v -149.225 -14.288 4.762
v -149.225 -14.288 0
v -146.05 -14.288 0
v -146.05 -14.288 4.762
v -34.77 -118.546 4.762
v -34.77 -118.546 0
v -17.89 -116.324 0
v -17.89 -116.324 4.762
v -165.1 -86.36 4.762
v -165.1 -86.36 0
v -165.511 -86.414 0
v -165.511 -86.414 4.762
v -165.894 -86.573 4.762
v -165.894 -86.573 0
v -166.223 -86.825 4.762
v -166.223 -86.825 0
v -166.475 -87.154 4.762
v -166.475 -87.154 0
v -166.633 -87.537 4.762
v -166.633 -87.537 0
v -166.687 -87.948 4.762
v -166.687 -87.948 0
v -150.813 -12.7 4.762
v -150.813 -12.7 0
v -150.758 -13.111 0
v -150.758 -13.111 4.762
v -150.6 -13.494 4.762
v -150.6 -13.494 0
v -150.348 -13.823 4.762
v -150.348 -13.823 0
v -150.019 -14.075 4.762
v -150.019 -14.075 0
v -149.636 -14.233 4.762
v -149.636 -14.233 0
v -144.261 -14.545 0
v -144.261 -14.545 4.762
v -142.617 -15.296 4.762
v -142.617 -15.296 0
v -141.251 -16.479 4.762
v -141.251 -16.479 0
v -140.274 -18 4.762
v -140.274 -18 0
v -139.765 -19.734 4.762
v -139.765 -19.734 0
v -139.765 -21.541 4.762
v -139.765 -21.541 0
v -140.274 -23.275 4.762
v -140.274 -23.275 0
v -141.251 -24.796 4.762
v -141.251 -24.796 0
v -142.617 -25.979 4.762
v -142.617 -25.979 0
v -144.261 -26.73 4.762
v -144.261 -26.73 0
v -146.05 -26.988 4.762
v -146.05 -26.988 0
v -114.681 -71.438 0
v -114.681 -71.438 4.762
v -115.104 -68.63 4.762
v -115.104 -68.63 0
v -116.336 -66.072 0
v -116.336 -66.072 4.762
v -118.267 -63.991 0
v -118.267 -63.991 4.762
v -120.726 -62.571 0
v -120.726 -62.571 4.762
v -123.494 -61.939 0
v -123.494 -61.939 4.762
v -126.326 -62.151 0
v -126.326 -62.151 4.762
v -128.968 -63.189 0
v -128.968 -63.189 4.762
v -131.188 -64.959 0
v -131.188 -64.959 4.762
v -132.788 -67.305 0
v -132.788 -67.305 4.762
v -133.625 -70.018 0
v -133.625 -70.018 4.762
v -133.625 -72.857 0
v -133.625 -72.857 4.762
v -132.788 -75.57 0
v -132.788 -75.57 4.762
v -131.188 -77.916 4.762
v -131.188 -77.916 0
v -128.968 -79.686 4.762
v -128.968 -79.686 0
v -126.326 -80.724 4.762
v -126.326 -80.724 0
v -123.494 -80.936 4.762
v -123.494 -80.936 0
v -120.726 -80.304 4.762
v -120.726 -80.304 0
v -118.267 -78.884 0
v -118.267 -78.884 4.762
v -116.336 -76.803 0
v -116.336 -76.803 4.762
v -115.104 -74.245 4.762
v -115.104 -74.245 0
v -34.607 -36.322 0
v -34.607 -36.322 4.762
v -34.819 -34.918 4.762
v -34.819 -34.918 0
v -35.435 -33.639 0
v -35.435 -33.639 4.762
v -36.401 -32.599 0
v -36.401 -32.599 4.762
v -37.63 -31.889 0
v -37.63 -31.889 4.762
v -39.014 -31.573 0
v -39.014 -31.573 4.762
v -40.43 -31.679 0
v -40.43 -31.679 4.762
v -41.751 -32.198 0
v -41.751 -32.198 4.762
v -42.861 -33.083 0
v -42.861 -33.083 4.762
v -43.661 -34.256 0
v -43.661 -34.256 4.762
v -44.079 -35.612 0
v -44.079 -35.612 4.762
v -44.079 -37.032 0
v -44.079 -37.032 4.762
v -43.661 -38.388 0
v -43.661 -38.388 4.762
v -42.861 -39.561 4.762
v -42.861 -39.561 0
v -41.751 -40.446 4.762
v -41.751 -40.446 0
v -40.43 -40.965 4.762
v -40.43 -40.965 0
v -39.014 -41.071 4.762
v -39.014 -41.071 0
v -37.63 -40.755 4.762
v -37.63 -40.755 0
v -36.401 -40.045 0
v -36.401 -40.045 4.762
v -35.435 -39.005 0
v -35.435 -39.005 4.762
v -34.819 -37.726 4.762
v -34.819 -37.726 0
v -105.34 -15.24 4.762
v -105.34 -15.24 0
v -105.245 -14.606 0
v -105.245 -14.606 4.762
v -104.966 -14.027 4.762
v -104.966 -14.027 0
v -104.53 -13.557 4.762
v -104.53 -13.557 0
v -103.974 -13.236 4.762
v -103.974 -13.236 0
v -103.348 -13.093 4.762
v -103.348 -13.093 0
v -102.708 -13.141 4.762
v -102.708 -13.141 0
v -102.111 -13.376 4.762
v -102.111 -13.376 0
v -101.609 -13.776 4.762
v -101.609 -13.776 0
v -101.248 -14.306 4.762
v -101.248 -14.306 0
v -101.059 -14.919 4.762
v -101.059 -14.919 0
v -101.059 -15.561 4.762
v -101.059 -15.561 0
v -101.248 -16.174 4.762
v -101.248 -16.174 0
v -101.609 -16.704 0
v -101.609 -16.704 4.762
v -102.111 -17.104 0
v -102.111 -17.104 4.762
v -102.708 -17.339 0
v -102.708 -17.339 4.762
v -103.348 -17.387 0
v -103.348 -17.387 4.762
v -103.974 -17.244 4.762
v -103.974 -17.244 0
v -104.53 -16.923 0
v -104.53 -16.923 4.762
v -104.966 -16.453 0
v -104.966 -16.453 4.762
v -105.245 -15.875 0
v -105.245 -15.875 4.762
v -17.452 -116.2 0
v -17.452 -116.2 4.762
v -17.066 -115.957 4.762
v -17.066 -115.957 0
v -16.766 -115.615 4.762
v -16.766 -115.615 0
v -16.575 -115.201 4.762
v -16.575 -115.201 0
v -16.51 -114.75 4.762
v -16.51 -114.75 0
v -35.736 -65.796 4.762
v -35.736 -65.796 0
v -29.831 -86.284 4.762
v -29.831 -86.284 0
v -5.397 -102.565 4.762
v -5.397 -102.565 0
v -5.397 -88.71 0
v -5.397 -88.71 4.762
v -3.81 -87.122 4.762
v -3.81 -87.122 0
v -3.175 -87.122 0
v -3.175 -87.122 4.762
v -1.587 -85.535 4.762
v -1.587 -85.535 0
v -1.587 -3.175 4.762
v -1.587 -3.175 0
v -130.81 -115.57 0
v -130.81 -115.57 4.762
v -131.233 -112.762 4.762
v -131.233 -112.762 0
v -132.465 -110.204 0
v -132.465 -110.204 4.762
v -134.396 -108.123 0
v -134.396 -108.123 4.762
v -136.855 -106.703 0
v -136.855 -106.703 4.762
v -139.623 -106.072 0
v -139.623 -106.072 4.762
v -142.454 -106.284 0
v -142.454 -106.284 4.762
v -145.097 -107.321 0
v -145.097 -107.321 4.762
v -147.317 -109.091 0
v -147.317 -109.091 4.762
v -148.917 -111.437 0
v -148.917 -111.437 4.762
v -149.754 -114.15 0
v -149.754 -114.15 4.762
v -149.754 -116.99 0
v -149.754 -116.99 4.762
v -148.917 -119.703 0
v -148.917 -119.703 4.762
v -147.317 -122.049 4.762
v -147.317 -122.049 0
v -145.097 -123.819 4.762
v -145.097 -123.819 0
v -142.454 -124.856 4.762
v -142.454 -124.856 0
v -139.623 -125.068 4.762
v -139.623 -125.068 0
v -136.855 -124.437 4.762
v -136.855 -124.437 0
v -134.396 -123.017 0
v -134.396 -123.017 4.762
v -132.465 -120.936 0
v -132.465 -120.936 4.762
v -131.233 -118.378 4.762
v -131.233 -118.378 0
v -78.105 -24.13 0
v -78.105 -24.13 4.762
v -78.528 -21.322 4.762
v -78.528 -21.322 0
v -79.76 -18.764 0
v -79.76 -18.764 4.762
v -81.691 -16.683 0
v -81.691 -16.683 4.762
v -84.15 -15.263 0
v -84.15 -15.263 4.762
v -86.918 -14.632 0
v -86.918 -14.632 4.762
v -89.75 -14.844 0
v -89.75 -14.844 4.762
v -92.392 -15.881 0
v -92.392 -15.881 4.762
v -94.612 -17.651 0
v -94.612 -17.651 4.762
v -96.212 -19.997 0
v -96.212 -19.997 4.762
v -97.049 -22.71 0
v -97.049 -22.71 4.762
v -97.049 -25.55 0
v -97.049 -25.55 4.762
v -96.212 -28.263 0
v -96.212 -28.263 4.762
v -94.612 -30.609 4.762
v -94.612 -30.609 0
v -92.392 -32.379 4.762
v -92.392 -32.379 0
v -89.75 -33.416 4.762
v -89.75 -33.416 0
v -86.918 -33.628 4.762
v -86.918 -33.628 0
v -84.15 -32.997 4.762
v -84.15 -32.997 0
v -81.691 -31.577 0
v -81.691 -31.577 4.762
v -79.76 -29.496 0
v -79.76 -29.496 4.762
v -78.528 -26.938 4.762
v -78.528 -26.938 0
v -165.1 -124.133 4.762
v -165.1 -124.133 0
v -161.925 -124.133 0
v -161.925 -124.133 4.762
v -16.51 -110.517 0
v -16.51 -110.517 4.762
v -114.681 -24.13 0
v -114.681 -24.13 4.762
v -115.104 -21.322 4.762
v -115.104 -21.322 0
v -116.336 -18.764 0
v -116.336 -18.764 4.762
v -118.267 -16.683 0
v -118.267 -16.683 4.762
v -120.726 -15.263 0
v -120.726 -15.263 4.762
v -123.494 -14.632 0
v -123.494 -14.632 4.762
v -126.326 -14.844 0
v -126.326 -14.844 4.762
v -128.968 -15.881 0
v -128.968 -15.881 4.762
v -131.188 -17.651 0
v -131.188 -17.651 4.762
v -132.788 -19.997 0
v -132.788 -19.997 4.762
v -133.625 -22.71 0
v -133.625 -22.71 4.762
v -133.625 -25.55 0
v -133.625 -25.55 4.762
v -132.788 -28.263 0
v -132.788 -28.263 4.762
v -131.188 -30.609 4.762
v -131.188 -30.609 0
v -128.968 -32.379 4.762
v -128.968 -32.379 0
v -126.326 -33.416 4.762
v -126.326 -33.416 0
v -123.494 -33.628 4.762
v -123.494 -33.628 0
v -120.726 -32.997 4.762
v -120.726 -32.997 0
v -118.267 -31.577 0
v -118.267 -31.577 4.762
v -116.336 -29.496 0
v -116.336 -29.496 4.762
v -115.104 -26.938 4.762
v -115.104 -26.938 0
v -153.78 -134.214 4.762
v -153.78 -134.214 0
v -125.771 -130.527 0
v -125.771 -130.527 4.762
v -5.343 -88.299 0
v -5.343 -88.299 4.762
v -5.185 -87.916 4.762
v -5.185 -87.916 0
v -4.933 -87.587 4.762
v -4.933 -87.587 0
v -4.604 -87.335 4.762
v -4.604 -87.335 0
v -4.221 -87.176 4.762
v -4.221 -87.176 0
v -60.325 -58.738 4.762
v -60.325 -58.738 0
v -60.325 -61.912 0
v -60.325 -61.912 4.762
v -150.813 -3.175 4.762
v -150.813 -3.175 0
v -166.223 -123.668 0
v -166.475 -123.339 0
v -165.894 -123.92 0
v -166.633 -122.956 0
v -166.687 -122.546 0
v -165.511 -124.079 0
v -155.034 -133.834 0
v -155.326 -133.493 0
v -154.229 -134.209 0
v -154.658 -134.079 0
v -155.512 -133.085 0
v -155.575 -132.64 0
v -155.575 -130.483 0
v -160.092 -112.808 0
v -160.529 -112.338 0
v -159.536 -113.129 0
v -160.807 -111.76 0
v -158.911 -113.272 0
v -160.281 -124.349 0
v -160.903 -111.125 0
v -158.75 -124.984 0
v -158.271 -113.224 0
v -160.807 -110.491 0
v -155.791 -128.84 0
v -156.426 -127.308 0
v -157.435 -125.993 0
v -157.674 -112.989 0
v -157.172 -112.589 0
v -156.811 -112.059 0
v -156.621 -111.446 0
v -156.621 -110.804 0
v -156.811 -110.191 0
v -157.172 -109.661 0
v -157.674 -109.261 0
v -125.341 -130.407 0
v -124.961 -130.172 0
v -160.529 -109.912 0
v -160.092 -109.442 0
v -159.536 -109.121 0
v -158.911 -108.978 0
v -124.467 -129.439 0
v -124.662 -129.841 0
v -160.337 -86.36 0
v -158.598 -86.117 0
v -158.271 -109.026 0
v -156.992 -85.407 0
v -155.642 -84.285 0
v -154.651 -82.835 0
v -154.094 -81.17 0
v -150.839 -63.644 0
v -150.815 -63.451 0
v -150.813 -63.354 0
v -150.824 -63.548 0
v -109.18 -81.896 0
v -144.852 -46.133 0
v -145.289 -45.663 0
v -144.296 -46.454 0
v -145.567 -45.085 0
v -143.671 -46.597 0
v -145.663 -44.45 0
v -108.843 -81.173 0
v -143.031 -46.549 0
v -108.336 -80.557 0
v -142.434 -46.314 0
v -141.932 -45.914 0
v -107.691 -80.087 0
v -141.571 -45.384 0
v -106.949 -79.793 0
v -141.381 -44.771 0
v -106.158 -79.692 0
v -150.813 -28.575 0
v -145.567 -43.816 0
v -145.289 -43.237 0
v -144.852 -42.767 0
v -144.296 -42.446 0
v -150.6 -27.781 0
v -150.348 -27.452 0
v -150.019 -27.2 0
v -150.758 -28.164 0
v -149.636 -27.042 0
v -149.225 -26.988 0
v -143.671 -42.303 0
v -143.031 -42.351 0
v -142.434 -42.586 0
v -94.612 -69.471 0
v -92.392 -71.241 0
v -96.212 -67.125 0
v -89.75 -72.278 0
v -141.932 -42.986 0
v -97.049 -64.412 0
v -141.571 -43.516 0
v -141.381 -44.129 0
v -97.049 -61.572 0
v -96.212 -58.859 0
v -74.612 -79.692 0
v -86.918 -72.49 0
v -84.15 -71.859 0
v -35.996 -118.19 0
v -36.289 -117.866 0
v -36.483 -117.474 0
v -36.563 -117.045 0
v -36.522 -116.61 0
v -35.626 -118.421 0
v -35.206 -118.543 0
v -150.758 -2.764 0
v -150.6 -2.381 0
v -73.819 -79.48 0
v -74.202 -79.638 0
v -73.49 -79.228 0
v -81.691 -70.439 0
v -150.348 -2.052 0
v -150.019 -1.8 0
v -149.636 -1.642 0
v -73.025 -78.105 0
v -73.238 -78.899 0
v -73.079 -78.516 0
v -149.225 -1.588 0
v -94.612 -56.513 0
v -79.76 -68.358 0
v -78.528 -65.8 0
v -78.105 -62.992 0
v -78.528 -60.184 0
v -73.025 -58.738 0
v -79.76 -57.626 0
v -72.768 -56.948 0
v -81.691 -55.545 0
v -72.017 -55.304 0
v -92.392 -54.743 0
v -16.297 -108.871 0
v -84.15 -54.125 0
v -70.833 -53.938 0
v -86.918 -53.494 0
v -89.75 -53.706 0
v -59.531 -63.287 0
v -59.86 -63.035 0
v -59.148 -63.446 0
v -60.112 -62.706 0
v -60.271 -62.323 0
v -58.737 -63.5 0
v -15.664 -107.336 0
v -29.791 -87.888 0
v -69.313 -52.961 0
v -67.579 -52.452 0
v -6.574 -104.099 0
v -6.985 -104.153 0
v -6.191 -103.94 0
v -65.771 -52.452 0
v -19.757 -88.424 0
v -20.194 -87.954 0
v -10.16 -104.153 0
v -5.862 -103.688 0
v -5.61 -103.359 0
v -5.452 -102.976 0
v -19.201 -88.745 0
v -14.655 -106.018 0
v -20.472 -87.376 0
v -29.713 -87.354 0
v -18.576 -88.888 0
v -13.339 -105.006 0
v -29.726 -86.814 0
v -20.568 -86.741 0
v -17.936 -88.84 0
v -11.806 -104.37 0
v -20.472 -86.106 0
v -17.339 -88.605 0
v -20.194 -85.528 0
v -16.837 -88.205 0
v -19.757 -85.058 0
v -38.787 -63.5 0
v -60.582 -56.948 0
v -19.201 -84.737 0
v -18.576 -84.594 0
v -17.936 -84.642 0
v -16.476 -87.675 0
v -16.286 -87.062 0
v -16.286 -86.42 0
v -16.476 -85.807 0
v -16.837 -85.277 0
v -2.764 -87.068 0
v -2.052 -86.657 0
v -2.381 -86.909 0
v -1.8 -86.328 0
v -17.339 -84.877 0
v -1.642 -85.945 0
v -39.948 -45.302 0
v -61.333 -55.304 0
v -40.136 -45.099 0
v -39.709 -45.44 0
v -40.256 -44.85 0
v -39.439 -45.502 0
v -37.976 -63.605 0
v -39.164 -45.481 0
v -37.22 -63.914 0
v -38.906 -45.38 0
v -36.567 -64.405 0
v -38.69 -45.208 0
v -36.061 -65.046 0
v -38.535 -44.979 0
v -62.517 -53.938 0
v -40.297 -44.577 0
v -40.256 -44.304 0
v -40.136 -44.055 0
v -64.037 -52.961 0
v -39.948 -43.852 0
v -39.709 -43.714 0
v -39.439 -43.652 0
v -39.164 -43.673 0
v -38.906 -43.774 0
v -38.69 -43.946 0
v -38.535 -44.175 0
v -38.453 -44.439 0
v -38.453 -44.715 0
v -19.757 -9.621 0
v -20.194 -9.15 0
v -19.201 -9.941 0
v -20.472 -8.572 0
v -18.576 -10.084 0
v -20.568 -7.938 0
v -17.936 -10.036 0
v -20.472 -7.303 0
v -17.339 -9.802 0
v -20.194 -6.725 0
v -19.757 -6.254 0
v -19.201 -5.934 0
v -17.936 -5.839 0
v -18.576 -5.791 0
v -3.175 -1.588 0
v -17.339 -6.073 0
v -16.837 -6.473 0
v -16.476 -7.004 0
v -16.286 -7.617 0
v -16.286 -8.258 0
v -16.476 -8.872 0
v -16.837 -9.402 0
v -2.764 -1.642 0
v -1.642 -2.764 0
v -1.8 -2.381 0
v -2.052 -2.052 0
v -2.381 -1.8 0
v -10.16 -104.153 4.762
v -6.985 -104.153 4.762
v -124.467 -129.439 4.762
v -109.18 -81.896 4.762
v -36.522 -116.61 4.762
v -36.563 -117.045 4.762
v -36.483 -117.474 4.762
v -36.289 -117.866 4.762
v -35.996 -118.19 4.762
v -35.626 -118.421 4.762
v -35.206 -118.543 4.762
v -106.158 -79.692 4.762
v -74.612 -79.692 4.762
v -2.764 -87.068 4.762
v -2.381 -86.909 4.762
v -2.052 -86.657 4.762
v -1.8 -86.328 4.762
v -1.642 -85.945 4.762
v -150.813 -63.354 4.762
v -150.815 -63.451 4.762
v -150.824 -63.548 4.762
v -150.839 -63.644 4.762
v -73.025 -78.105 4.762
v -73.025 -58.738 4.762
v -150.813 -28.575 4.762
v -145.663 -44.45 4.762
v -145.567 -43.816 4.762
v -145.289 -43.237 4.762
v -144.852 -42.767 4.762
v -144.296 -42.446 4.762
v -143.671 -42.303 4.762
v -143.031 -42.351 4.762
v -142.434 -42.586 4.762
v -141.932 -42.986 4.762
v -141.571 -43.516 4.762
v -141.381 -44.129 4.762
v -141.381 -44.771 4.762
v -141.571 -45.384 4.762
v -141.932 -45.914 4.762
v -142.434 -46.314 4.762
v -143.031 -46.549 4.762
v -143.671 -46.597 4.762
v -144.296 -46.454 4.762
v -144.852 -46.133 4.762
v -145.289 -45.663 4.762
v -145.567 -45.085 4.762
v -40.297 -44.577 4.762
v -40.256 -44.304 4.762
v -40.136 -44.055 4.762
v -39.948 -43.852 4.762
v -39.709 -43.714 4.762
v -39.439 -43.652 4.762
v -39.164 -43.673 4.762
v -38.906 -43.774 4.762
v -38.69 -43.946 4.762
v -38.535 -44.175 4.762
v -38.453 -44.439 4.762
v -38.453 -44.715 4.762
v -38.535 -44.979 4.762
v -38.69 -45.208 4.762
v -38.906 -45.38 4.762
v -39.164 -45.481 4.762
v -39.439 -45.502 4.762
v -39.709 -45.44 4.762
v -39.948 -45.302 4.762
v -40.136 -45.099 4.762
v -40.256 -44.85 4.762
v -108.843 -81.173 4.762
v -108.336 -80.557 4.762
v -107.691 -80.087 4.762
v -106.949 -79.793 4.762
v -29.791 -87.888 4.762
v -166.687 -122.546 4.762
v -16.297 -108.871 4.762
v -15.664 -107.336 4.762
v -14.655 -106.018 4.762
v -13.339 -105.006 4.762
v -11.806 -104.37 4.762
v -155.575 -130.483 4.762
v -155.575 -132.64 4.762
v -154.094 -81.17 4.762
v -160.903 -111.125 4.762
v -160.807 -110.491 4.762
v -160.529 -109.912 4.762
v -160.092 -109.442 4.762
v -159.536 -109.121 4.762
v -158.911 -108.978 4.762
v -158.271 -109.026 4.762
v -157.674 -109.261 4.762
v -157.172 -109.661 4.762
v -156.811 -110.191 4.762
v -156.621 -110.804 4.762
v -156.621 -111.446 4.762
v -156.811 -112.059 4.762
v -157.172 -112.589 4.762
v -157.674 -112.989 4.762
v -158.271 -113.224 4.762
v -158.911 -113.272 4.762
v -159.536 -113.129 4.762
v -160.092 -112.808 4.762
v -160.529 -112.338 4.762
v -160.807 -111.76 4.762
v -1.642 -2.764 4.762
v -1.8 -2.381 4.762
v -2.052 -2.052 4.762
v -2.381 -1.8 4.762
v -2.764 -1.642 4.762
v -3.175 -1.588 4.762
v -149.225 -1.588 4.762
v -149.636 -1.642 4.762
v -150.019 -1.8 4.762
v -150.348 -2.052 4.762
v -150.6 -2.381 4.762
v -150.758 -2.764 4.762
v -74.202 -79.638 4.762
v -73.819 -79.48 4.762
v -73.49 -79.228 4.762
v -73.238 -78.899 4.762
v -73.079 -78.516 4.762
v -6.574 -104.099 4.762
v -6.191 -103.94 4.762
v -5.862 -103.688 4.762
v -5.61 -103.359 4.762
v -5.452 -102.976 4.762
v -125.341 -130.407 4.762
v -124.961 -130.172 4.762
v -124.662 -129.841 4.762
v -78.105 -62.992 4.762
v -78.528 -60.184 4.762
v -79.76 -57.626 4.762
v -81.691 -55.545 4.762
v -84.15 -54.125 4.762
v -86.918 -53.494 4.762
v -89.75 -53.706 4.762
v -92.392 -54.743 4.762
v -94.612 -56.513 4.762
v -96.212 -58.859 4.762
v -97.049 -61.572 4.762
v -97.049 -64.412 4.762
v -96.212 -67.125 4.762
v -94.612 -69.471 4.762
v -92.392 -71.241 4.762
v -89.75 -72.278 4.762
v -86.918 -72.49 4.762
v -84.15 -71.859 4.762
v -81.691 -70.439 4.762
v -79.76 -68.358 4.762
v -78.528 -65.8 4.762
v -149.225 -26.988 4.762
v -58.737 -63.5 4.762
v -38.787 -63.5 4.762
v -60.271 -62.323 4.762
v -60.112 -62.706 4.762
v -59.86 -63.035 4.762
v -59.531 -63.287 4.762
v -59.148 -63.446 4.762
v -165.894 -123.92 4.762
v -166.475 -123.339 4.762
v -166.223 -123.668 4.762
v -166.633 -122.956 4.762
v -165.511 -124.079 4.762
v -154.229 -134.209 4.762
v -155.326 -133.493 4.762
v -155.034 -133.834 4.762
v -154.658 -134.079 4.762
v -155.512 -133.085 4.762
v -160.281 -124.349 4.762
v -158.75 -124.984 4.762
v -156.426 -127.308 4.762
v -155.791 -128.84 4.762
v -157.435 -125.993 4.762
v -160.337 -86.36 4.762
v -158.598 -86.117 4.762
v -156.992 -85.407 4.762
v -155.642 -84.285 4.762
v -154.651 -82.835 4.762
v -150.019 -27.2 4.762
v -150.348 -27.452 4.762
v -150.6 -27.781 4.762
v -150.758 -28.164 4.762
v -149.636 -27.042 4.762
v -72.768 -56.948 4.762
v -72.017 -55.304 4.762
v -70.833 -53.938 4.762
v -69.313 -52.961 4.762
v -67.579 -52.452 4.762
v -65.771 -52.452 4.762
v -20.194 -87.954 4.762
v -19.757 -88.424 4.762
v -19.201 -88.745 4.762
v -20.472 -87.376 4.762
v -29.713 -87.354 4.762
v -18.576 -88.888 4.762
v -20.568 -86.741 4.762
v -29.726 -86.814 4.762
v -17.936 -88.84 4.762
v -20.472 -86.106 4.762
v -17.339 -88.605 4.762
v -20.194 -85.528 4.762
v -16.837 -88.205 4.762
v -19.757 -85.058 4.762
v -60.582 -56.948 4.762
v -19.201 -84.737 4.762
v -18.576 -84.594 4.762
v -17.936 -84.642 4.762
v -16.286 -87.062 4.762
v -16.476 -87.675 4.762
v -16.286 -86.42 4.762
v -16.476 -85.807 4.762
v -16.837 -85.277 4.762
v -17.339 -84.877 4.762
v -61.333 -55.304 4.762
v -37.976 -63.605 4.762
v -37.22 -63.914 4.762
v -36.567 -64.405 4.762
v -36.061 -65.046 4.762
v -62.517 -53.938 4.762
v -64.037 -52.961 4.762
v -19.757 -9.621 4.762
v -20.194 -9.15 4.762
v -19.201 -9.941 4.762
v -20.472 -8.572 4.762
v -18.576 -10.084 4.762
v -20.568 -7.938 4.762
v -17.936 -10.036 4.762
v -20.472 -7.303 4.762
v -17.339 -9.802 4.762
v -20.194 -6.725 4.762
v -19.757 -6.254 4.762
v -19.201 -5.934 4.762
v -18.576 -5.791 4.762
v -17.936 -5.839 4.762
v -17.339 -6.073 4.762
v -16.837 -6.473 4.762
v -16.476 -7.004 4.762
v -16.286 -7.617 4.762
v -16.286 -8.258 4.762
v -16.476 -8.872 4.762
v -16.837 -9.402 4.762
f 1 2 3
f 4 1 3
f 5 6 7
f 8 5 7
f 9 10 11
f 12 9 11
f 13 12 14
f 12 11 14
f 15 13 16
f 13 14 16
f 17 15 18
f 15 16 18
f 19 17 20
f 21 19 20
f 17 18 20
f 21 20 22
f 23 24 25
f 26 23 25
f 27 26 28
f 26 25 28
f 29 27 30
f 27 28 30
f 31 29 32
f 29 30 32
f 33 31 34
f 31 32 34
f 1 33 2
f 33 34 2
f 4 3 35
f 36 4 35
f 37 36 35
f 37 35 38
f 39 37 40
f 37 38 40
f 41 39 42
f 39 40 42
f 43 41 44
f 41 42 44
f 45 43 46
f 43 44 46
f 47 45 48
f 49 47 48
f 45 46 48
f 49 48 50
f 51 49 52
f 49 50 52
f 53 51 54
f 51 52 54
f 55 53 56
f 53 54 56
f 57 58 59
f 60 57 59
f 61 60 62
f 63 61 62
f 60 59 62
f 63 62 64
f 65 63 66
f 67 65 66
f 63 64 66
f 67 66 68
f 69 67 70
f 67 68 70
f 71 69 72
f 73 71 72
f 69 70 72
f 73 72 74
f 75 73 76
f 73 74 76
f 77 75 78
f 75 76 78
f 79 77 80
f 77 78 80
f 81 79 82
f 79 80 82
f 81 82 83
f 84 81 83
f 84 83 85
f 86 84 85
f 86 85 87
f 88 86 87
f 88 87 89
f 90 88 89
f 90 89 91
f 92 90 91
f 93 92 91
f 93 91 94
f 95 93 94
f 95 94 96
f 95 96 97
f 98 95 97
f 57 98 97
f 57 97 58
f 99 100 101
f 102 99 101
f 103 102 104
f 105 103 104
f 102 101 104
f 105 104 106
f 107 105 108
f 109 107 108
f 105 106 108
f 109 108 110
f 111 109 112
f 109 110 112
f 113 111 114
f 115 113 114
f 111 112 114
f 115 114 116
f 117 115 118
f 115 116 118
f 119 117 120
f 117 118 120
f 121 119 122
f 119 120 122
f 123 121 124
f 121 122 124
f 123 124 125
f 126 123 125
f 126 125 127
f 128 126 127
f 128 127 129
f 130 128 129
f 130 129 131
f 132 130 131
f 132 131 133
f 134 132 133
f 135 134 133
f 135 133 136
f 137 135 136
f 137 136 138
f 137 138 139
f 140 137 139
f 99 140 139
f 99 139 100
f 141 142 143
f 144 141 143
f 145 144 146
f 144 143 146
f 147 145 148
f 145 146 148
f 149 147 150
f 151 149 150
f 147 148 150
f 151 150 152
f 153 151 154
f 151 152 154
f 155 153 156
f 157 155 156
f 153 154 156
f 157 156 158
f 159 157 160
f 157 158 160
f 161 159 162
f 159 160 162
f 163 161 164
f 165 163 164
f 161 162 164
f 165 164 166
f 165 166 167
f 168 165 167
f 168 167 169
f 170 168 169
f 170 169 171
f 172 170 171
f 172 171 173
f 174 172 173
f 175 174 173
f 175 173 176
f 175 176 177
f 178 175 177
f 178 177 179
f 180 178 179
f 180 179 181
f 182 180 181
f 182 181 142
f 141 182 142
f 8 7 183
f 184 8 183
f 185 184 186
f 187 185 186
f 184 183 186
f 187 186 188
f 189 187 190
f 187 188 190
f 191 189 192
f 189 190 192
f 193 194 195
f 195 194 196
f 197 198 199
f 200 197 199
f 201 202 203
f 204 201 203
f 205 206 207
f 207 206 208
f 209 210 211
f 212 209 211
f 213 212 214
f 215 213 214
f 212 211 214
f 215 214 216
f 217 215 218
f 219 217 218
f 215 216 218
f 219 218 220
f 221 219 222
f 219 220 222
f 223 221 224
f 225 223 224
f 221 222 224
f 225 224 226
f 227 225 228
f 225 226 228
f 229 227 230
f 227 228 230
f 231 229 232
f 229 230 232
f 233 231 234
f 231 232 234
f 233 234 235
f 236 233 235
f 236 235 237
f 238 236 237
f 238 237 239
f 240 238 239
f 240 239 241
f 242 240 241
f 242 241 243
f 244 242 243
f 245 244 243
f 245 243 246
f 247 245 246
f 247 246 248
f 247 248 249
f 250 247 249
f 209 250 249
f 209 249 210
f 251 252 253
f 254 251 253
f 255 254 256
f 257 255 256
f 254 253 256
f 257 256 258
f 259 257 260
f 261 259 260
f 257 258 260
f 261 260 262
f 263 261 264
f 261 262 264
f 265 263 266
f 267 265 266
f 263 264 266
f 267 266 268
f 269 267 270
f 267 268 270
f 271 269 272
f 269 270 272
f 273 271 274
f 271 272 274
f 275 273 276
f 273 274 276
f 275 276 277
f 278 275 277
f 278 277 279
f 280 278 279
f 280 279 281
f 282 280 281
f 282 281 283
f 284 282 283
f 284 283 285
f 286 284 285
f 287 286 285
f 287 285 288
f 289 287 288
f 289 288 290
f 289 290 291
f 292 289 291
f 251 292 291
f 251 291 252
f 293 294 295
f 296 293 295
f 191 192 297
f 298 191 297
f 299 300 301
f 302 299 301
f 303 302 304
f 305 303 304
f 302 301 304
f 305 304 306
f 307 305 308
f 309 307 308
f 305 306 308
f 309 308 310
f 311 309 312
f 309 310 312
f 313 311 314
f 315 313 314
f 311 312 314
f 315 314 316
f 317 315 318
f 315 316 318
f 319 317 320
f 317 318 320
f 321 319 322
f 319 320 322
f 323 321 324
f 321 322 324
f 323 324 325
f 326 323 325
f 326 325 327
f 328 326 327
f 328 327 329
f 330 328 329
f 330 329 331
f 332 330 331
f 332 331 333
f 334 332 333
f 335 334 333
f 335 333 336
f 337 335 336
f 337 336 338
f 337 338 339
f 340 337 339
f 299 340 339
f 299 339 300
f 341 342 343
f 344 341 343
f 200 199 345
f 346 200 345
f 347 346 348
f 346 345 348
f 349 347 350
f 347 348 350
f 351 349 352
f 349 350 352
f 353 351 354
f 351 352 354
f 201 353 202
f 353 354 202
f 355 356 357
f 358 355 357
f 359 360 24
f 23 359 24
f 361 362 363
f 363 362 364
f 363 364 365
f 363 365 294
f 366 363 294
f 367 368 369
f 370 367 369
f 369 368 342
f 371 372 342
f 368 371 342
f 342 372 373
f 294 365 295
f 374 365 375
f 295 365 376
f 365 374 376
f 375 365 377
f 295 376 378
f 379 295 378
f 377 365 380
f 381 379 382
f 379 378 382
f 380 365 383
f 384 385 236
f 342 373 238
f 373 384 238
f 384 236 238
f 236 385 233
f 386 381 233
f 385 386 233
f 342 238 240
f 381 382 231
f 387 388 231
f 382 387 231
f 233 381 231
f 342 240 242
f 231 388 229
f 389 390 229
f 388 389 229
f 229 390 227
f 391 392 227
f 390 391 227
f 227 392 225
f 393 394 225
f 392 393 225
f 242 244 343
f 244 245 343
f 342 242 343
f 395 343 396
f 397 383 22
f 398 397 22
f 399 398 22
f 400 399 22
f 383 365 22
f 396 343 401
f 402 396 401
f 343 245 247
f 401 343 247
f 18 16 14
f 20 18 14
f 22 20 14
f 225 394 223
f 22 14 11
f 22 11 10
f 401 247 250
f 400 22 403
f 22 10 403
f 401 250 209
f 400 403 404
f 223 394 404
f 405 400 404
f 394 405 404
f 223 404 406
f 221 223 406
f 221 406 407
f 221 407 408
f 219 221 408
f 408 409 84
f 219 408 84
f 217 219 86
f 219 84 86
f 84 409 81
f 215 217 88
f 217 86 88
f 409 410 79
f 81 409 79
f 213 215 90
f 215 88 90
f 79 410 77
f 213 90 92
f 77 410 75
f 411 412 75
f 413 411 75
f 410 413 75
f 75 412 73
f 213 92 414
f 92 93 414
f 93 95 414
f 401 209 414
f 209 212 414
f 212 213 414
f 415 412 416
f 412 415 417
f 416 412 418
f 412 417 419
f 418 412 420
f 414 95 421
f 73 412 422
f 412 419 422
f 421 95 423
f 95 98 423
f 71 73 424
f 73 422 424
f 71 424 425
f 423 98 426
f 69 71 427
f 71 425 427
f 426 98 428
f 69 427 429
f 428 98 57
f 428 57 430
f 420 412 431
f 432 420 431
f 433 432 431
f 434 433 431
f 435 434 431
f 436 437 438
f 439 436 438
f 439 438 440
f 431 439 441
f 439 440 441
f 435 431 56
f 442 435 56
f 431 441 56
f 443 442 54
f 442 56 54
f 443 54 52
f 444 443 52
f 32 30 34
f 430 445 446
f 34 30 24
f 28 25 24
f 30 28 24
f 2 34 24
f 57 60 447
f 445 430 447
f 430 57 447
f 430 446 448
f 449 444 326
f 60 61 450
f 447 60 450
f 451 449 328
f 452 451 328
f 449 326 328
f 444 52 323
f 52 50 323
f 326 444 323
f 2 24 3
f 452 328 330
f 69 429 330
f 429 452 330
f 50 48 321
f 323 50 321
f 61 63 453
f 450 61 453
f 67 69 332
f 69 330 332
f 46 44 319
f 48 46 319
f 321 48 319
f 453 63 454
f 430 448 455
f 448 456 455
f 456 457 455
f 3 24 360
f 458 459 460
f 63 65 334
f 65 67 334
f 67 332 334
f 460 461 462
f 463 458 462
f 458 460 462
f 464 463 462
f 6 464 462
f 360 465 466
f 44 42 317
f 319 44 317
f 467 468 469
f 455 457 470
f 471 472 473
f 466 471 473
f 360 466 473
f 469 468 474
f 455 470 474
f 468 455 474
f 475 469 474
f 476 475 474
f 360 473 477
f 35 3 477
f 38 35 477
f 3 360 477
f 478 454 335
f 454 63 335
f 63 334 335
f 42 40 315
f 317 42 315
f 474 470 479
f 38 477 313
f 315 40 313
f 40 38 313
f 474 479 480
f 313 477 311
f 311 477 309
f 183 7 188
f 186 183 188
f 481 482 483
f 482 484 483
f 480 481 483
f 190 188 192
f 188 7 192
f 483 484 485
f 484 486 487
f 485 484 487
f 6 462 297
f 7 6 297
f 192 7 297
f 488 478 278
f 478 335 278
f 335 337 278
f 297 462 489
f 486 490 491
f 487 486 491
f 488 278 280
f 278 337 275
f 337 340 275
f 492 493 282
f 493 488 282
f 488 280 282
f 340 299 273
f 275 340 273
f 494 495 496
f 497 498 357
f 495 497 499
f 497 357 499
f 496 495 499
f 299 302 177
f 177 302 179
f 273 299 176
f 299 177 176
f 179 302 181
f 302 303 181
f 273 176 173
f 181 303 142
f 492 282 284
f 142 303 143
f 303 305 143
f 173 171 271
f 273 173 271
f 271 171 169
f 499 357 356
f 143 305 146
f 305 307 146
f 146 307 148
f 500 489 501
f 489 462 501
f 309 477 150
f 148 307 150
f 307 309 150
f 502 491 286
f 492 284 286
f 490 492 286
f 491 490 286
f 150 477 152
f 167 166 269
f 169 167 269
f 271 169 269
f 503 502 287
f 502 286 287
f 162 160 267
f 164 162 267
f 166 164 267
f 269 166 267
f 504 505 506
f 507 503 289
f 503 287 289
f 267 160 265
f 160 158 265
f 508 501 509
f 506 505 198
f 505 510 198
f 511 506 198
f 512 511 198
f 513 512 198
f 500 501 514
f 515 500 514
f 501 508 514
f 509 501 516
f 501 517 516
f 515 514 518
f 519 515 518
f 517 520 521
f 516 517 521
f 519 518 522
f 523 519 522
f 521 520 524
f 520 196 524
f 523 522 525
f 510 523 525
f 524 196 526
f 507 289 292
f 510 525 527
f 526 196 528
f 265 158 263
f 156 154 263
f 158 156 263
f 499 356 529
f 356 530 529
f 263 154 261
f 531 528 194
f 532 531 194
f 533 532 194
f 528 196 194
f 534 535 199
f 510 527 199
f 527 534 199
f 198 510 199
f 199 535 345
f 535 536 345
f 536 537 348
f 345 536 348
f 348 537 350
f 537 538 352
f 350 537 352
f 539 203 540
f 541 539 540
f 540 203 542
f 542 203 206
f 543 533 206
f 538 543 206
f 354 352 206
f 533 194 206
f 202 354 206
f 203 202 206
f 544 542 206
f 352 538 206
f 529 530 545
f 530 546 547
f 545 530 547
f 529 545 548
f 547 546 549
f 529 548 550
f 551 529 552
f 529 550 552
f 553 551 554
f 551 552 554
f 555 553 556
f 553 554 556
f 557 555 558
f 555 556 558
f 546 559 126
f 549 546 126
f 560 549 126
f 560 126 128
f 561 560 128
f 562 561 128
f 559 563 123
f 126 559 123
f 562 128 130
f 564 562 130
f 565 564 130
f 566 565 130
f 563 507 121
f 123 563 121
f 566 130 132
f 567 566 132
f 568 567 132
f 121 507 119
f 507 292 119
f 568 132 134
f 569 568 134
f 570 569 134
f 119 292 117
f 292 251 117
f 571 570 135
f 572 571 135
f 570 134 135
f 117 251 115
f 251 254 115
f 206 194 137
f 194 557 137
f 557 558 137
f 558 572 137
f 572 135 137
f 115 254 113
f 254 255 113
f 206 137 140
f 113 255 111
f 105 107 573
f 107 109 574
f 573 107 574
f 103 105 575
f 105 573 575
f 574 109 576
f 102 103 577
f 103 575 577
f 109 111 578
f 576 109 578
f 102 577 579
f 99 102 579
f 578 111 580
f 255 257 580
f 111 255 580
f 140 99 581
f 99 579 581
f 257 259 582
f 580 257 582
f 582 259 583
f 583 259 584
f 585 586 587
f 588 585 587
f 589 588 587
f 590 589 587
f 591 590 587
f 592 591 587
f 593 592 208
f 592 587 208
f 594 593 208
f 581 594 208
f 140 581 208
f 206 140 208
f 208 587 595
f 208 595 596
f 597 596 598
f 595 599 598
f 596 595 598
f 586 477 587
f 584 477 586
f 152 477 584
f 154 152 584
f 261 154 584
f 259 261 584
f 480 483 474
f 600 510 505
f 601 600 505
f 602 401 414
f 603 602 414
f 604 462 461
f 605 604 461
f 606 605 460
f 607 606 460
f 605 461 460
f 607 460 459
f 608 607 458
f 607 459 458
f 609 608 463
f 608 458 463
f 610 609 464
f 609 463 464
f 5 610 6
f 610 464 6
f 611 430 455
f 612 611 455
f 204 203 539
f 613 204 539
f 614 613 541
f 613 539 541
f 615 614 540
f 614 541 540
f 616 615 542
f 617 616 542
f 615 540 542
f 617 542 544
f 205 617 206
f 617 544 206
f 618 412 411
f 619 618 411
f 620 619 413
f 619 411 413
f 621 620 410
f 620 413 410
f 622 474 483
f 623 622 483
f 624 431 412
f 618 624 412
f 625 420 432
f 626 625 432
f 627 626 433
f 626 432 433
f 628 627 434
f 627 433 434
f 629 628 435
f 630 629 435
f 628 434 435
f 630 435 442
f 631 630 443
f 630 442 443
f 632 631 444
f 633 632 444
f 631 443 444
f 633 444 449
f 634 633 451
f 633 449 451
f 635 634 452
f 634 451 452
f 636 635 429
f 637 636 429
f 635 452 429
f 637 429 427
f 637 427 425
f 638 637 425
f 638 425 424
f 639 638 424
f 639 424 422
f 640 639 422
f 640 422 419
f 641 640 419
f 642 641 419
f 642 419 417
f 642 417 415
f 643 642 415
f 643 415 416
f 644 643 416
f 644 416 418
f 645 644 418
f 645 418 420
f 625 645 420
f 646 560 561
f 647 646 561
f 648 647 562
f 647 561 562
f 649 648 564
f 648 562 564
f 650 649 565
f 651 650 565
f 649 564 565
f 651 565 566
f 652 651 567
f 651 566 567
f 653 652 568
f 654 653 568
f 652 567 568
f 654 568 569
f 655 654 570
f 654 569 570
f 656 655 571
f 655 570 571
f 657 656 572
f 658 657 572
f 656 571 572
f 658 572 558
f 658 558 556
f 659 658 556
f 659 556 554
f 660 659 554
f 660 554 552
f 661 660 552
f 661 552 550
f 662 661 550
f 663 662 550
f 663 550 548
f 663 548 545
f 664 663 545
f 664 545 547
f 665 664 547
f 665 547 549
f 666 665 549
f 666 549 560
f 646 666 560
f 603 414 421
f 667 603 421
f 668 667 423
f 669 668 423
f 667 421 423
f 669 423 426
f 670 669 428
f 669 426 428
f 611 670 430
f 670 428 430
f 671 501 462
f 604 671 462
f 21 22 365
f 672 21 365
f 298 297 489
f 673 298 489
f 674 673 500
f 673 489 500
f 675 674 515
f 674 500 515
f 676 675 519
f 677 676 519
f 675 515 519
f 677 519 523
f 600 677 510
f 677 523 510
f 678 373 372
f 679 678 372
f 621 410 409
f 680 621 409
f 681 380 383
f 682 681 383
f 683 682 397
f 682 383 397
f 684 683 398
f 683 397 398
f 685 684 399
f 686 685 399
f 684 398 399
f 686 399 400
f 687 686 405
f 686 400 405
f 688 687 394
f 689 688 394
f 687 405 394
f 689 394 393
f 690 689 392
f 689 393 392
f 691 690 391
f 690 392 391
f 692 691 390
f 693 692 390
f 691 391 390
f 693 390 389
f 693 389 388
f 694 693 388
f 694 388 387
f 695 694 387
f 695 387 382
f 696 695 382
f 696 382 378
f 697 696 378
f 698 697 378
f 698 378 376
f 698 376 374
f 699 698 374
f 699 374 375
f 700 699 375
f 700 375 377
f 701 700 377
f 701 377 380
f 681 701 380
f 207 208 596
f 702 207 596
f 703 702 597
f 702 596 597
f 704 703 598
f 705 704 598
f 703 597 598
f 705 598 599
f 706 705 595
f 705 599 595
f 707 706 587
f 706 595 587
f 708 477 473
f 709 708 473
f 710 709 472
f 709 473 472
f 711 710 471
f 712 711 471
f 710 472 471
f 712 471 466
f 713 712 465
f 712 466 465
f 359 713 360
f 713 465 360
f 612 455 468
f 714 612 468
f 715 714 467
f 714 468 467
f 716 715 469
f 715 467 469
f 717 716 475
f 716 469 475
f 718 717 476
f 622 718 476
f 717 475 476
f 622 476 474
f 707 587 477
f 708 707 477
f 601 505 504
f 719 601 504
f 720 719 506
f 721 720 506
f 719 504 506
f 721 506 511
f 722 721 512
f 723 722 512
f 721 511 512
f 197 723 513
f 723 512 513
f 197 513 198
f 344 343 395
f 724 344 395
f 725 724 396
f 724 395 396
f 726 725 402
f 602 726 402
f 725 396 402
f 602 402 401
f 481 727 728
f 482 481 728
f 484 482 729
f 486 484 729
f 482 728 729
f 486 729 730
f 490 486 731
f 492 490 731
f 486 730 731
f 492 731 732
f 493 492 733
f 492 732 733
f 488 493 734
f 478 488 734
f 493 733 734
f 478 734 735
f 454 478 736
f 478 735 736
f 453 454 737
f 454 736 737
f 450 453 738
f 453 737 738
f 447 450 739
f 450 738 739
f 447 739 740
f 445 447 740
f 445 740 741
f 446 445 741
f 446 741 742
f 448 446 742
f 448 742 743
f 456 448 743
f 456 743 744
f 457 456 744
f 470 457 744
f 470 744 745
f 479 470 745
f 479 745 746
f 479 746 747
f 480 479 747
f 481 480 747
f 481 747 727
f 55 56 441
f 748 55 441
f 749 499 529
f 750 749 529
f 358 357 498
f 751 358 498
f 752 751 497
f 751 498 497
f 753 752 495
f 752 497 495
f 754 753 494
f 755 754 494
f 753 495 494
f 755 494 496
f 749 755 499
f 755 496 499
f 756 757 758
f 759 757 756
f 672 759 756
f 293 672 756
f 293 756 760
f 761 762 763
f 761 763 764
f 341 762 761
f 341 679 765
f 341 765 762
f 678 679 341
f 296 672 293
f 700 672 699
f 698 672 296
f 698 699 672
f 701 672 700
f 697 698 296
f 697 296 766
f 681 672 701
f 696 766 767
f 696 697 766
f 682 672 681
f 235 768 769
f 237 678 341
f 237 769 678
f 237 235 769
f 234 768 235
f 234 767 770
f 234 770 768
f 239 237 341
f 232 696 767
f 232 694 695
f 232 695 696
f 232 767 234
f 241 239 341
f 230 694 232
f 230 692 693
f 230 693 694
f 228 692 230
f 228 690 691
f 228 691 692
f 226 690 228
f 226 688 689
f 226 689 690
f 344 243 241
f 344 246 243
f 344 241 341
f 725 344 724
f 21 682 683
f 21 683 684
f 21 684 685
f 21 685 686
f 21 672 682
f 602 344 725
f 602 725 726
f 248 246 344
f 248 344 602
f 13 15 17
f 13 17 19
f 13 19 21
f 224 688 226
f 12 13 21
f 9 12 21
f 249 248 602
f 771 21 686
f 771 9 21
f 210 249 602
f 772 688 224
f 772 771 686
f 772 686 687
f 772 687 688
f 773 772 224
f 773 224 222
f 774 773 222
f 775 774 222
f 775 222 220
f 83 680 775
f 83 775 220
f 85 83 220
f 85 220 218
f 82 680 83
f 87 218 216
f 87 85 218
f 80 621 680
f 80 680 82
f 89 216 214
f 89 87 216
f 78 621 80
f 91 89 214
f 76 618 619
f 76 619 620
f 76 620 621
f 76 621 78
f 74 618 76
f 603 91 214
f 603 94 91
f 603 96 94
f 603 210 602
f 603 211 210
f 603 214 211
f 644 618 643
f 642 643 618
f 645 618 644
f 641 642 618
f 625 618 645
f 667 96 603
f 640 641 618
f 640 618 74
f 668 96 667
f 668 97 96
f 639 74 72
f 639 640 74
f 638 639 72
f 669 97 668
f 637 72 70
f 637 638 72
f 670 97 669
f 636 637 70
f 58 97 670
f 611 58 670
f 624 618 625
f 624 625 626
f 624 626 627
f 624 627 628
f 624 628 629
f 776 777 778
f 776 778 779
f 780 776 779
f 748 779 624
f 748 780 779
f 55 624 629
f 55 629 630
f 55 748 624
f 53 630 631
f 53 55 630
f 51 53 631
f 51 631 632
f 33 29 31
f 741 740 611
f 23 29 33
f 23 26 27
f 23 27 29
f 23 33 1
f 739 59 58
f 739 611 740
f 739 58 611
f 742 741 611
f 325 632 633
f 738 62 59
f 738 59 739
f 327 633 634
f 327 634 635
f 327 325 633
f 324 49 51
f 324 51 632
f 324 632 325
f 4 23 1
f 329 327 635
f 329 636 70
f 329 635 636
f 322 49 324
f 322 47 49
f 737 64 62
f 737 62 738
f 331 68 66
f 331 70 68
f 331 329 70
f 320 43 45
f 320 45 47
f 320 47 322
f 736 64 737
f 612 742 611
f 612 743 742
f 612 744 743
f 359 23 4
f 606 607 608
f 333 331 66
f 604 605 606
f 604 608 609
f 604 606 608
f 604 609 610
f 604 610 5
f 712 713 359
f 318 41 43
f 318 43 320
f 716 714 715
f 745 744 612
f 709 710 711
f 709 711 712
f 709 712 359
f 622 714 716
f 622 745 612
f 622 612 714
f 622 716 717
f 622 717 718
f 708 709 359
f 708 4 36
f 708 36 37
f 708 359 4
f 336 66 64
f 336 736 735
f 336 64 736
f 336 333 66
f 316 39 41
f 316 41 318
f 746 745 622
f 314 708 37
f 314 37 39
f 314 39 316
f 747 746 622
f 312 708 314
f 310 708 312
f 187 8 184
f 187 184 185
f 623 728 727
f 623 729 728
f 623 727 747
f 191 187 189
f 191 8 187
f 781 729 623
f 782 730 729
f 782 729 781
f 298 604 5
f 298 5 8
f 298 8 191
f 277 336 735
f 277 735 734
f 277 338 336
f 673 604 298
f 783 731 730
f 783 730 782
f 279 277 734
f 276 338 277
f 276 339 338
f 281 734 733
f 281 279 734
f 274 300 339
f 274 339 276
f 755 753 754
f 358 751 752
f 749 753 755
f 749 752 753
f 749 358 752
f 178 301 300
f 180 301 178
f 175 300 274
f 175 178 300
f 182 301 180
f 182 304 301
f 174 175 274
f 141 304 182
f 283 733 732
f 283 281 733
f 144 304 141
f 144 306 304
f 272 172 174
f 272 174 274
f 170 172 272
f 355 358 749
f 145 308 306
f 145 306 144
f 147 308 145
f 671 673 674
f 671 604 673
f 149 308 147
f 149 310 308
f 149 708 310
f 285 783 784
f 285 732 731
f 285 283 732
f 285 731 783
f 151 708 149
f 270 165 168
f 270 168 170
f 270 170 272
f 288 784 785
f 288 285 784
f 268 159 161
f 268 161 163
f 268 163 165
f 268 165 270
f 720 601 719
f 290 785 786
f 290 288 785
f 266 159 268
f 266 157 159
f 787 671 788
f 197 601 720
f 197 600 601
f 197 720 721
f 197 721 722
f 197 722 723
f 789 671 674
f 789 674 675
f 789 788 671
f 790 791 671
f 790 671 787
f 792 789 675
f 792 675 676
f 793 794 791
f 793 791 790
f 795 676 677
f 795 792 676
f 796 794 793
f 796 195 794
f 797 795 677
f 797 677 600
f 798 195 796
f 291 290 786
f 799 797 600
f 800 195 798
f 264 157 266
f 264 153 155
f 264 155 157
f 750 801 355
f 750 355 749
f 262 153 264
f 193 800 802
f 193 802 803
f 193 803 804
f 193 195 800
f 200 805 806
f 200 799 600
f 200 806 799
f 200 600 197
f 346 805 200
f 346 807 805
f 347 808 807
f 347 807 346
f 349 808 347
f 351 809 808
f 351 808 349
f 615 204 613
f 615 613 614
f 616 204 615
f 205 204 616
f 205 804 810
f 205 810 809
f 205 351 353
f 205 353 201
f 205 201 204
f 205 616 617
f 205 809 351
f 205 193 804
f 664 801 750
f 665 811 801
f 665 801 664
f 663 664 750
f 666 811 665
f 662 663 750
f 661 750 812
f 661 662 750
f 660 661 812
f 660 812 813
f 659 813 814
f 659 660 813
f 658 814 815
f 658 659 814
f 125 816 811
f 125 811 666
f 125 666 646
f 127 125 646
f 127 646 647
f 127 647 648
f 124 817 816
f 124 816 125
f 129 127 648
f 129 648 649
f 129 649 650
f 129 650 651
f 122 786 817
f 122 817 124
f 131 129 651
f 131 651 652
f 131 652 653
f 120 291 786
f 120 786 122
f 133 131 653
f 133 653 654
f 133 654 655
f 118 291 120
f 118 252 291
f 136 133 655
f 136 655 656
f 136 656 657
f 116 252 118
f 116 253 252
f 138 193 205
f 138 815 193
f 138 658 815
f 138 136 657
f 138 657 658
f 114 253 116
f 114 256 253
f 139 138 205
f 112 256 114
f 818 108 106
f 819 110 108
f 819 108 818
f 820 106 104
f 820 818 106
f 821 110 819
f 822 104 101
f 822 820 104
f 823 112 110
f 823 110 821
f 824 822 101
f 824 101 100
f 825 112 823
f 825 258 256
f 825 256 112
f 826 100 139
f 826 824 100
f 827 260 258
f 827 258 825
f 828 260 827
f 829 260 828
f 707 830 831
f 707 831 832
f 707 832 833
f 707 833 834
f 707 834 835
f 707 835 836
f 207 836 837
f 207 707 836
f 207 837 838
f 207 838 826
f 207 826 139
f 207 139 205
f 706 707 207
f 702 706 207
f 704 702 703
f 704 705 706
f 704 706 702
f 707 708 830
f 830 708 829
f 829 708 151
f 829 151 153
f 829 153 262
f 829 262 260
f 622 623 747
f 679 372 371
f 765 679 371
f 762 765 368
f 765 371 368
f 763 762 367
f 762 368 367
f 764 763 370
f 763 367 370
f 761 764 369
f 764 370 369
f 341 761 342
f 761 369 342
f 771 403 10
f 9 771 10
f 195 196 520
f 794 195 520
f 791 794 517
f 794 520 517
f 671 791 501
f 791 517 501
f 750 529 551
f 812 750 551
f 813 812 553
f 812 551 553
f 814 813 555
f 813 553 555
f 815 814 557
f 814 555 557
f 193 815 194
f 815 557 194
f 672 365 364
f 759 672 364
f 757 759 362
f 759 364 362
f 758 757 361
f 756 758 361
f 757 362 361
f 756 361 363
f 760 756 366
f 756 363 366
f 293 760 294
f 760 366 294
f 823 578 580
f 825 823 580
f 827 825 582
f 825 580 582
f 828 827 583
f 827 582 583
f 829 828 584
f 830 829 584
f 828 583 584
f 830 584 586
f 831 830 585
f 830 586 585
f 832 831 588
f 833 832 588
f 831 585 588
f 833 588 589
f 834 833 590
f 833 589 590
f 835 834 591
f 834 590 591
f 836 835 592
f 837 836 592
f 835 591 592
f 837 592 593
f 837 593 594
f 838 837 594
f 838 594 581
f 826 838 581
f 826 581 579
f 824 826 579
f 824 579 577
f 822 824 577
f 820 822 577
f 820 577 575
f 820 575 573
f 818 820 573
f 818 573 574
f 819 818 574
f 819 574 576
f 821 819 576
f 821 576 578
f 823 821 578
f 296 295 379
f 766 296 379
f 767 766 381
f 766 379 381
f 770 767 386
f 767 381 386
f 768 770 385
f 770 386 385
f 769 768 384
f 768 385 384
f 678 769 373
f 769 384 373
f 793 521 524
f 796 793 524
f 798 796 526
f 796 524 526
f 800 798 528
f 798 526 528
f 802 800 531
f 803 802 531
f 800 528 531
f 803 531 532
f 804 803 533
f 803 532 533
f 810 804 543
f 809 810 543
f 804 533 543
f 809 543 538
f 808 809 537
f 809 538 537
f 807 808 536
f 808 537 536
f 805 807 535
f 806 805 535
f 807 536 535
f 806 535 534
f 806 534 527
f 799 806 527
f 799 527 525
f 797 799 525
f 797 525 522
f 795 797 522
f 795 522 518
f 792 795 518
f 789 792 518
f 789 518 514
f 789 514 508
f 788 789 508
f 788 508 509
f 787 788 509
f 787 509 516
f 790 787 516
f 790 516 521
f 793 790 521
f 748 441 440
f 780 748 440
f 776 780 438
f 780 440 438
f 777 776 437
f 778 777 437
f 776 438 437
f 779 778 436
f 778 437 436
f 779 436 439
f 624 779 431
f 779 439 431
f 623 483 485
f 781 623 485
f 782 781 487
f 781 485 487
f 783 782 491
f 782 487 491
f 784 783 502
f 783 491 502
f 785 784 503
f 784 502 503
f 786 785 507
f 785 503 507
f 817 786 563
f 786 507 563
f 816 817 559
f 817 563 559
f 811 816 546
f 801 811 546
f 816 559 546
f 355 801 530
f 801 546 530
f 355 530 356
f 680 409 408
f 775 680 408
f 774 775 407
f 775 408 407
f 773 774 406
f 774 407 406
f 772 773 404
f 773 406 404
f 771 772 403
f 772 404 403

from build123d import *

# Parameters (mm, degrees)
BOSS_EXTRUDE1_DEPTH   = 4.7625
F_6_CLEARANCE_HOLE1_D = 4.3053
SKETCH5_R             = 9.525
SKETCH5_R_2           = 4.7625
CUT_EXTRUDE1_DEPTH    = 5.7625
F_0_CLEARANCE_HOLE1_D = 1.8542


with BuildPart() as part:
    # Sketch1 → Boss-Extrude1 (new body)
    with BuildSketch(Plane.XY):
        with BuildLine():
            Line((-1.58748798, -85.534500226), (-1.587499702, -3.175000338))
            ThreePointArc((-1.587499702, -3.175000338), (-2.052467807, -2.052468316), (-3.174999928, -1.587500451))
            Line((-3.174999928, -1.587500451), (-149.225000608, -1.587521198))
            ThreePointArc((-149.225000608, -1.587521198), (-150.34753241, -2.052489195), (-150.812500382, -3.175021007))
            Line((-150.812500382, -3.175021007), (-150.812501529, -12.700020556))
            ThreePointArc((-150.812501529, -12.700020556), (-150.347533612, -13.822552695), (-149.225001529, -14.287520747))
            Line((-149.225001529, -14.287520747), (-146.049997068, -14.287520747))
            ThreePointArc((-146.049997068, -14.287520747), (-139.699997068, -20.637520747), (-146.049997068, -26.987520747))
            Line((-146.049997068, -26.987520747), (-149.225013631, -26.987520747))
            ThreePointArc((-149.225013631, -26.987520747), (-150.347545646, -27.452488732), (-150.812513631, -28.575020747))
            Line((-150.812513631, -28.575020747), (-150.812513631, -63.3538504))
            ThreePointArc((-150.812513631, -63.3538504), (-150.819200601, -63.499405937), (-150.839205177, -63.643735238))
            Line((-150.839205177, -63.643735238), (-154.094231629, -81.169566712))
            ThreePointArc((-154.094231629, -81.169566712), (-156.277952028, -84.892947063), (-160.337486649, -86.360044427))
            Line((-160.337486649, -86.360044427), (-165.099987777, -86.360045103))
            ThreePointArc((-165.099987777, -86.360045103), (-166.222519646, -86.825013168), (-166.687487552, -87.947545103))
            Line((-166.687487552, -87.947545103), (-166.687487552, -122.545535149))
            ThreePointArc((-166.687487552, -122.545535149), (-166.222519567, -123.668067164), (-165.099987552, -124.133035149))
            Line((-165.099987552, -124.133035149), (-161.924987552, -124.133035149))
            ThreePointArc((-161.924987552, -124.133035149), (-157.434859491, -125.992907088), (-155.574987552, -130.483035149))
            Line((-155.574987552, -130.483035149), (-155.574987552, -132.640440399))
            ThreePointArc((-155.574987552, -132.640440399), (-155.034199033, -133.833986093), (-153.780277221, -134.214359116))
            Line((-153.780277221, -134.214359116), (-125.771097932, -130.526880708))
            ThreePointArc((-125.771097932, -130.526880708), (-124.961326394, -130.171938663), (-124.467007026, -129.438888758))
            Line((-124.467007026, -129.438888758), (-109.180488679, -81.895646464))
            ThreePointArc((-109.180488679, -81.895646464), (-108.028045294, -80.301738907), (-106.157886207, -79.6925))
            Line((-106.157886207, -79.6925), (-74.612491751, -79.6925))
            ThreePointArc((-74.612491751, -79.6925), (-73.489959736, -79.227532015), (-73.024991751, -78.105))
            Line((-73.024991751, -78.105), (-73.024991751, -58.7375))
            ThreePointArc((-73.024991751, -58.7375), (-66.674991751, -52.3875), (-60.324991751, -58.7375))
            Line((-60.324991751, -58.7375), (-60.324991751, -61.9125))
            ThreePointArc((-60.324991751, -61.9125), (-59.860023766, -63.035032015), (-58.737491751, -63.5))
            Line((-58.737491751, -63.5), (-38.786604302, -63.5))
            ThreePointArc((-38.786604302, -63.5), (-36.87752741, -64.138062787), (-35.735764486, -65.795795009))
            Line((-35.735764486, -65.795795009), (-29.83134609, -86.284116742))
            ThreePointArc((-29.83134609, -86.284116742), (-29.708193003, -87.083358908), (-29.790944576, -87.887788459))
            Line((-29.790944576, -87.887788459), (-36.522349245, -116.610151533))
            ThreePointArc((-36.522349245, -116.610151533), (-36.153591729, -118.037818788), (-34.769518371, -118.546303629))
            Line((-34.769518371, -118.546303629), (-17.8902735, -116.324110206))
            ThreePointArc((-17.8902735, -116.324110206), (-16.903937981, -115.796902916), (-16.509983709, -114.750191247))
            Line((-16.509983709, -114.750191247), (-16.509984311, -110.516938696))
            ThreePointArc((-16.509984311, -110.516938696), (-14.655116284, -106.017688645), (-10.160000902, -104.152822935))
            Line((-10.160000902, -104.152822935), (-6.9849852, -104.152822484))
            ThreePointArc((-6.9849852, -104.152822484), (-5.862453251, -103.687854339), (-5.397485425, -102.565322258))
            Line((-5.397485425, -102.565322258), (-5.397487394, -88.709500767))
            ThreePointArc((-5.397487394, -88.709500767), (-4.932519529, -87.586968646), (-3.809987507, -87.122000541))
            Line((-3.809987507, -87.122000541), (-3.17498789, -87.122000474))
            ThreePointArc((-3.17498789, -87.122000474), (-2.052455852, -86.657032363), (-1.58748798, -85.534500226))
        make_face()
    extrude(amount=BOSS_EXTRUDE1_DEPTH)

    # #6 Clearance Hole1 (through all)
    with Locations(Plane.XY.offset(4.7625)):
        with Locations((-103.187497835, -15.240014659), (-18.414998872, -7.937503157), (-143.510001128, -44.450020387), (-158.750001128, -111.125021649), (-18.414987678, -86.741003157)):
            Hole(F_6_CLEARANCE_HOLE1_D / 2)

    # Sketch5 → Cut-Extrude1 (cut, through all)
    with BuildSketch(Plane.XY.offset(4.7625)):
        with Locations((-124.205996572, -24.130021649)):
            Circle(SKETCH5_R)
        with Locations((-87.63, -24.130021649)):
            Circle(SKETCH5_R)
        with Locations((-87.63, -62.992021649)):
            Circle(SKETCH5_R)
        with Locations((-124.205996572, -71.437521424)):
            Circle(SKETCH5_R)
        with Locations((-140.334987552, -115.57)):
            Circle(SKETCH5_R)
        with Locations((-39.36999484, -36.322003157)):
            Circle(SKETCH5_R_2)
    extrude(amount=-CUT_EXTRUDE1_DEPTH, mode=Mode.SUBTRACT)

    # #0 Clearance Hole1 (through all)
    with Locations(Plane.XY.offset(6.35)):
        with Locations((-39.36999484, -44.577003157)):
            Hole(F_0_CLEARANCE_HOLE1_D / 2)


solid = part.part
